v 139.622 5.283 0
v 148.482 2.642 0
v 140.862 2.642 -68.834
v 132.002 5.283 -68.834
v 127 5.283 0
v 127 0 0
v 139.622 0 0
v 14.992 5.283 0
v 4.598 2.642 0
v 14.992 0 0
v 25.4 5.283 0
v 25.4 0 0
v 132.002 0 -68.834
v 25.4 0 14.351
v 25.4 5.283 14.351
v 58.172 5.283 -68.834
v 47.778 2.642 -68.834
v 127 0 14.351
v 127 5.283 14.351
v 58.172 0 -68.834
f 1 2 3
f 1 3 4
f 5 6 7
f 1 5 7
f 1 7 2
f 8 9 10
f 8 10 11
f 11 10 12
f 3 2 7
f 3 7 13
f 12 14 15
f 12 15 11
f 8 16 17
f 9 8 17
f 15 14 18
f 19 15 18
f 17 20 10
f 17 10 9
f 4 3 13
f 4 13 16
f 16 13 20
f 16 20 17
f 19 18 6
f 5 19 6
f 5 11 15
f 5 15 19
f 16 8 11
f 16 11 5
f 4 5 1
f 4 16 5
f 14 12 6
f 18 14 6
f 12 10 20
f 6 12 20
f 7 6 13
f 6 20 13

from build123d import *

# Parameters (mm, degrees)
BOSS_EXTRUDE1_DEPTH = 5.2832
SKETCH2_W           = 101.6
SKETCH2_H           = 14.351
BOSS_EXTRUDE2_DEPTH = 5.2832
CHAMFER1_SIZE       = 12.7
CHAMFER1_SIZE_2     = 3.81
CHAMFER2_SIZE       = 12.7
CHAMFER2_SIZE2      = 3.81
CHAMFER3_SIZE       = 3.81
CHAMFER3_SIZE_2     = 12.7


with BuildPart() as part:
    # Sketch1 → Boss-Extrude1 (new body)
    with BuildSketch(Plane(origin=(0, 0, 0), x_dir=(1, 0, 0), z_dir=(0, 1, 0))):
        Polygon((0, 0), (152.4, 0), (144.78, 68.834), (43.18, 68.834), align=None)
    extrude(amount=BOSS_EXTRUDE1_DEPTH)

    # Sketch2 → Boss-Extrude2 (add)
    with BuildSketch(Plane(origin=(0, 0, 0), x_dir=(1, 0, 0), z_dir=(0, 1, 0))):
        with Locations((76.2, -7.1755)):
            Rectangle(SKETCH2_W, SKETCH2_H)
    extrude(amount=BOSS_EXTRUDE2_DEPTH)

    # Chamfer1
    # the kernel refuses this chamfer: 12.7, 3.81 mm, written as the material it takes off along each edge
    with BuildSketch(Plane(origin=(60.699541801, 0, -96.762210753), x_dir=(0.8470671798621036, -0.011069119507992343, 0.531370555633054), z_dir=(-0.5314031118215187, 0, 0.8471190782566561))) as chamfer1_piece_1:
        Polygon((CHAMFER1_SIZE * 0.99993873542, CHAMFER1_SIZE * 0.011069119508), (-CHAMFER1_SIZE_2 * 0.011069119508, CHAMFER1_SIZE_2 * 0.99993873542), (0, 0), align=None)
    extrude(amount=147.193499363, mode=Mode.SUBTRACT)
    with BuildSketch(Plane(origin=(60.699541801, 5.2832, -96.762210753), x_dir=(0.8470671798621036, 0.01106911950799233, 0.531370555633054), z_dir=(-0.5314031118215187, 0, 0.8471190782566561))) as chamfer1_piece_2:
        Polygon((CHAMFER1_SIZE * 0.99993873542, -CHAMFER1_SIZE * 0.011069119508), (-CHAMFER1_SIZE_2 * 0.011069119508, -CHAMFER1_SIZE_2 * 0.99993873542), (0, 0), align=None)
    extrude(amount=147.193499363, mode=Mode.SUBTRACT)

    # Chamfer2
    chamfer2_edges = [part.edges().sort_by_distance(p)[0] for p in [
        (148.59, 0, -34.417),
    ]]
    chamfer2_side = [part.faces().sort_by_distance(p)[0] for p in [
        (89.414881318, 0, -25.614395123),
    ]]
    chamfer(chamfer2_edges, length=CHAMFER2_SIZE, length2=CHAMFER2_SIZE2, reference=chamfer2_side[0])

    # Chamfer3
    # the kernel refuses this chamfer: 12.7, 3.81 mm, written as the material it takes off along each edge
    with BuildSketch(Plane(origin=(156.027485672, 5.2832, 32.768287237), x_dir=(0.12133658482182727, -0.9925205348140393, -0.013432094260718893), z_dir=(-0.1100289719975825, 0, -0.9939283803781614))) as chamfer3_piece_1:
        Polygon((CHAMFER3_SIZE * 0.992520534814, CHAMFER3_SIZE * 0.122077794756), (-CHAMFER3_SIZE_2 * 0.122077794756, CHAMFER3_SIZE_2 * 0.992520534814), (0, 0), align=None)
    extrude(amount=135.191405264, mode=Mode.SUBTRACT)


solid = part.part
